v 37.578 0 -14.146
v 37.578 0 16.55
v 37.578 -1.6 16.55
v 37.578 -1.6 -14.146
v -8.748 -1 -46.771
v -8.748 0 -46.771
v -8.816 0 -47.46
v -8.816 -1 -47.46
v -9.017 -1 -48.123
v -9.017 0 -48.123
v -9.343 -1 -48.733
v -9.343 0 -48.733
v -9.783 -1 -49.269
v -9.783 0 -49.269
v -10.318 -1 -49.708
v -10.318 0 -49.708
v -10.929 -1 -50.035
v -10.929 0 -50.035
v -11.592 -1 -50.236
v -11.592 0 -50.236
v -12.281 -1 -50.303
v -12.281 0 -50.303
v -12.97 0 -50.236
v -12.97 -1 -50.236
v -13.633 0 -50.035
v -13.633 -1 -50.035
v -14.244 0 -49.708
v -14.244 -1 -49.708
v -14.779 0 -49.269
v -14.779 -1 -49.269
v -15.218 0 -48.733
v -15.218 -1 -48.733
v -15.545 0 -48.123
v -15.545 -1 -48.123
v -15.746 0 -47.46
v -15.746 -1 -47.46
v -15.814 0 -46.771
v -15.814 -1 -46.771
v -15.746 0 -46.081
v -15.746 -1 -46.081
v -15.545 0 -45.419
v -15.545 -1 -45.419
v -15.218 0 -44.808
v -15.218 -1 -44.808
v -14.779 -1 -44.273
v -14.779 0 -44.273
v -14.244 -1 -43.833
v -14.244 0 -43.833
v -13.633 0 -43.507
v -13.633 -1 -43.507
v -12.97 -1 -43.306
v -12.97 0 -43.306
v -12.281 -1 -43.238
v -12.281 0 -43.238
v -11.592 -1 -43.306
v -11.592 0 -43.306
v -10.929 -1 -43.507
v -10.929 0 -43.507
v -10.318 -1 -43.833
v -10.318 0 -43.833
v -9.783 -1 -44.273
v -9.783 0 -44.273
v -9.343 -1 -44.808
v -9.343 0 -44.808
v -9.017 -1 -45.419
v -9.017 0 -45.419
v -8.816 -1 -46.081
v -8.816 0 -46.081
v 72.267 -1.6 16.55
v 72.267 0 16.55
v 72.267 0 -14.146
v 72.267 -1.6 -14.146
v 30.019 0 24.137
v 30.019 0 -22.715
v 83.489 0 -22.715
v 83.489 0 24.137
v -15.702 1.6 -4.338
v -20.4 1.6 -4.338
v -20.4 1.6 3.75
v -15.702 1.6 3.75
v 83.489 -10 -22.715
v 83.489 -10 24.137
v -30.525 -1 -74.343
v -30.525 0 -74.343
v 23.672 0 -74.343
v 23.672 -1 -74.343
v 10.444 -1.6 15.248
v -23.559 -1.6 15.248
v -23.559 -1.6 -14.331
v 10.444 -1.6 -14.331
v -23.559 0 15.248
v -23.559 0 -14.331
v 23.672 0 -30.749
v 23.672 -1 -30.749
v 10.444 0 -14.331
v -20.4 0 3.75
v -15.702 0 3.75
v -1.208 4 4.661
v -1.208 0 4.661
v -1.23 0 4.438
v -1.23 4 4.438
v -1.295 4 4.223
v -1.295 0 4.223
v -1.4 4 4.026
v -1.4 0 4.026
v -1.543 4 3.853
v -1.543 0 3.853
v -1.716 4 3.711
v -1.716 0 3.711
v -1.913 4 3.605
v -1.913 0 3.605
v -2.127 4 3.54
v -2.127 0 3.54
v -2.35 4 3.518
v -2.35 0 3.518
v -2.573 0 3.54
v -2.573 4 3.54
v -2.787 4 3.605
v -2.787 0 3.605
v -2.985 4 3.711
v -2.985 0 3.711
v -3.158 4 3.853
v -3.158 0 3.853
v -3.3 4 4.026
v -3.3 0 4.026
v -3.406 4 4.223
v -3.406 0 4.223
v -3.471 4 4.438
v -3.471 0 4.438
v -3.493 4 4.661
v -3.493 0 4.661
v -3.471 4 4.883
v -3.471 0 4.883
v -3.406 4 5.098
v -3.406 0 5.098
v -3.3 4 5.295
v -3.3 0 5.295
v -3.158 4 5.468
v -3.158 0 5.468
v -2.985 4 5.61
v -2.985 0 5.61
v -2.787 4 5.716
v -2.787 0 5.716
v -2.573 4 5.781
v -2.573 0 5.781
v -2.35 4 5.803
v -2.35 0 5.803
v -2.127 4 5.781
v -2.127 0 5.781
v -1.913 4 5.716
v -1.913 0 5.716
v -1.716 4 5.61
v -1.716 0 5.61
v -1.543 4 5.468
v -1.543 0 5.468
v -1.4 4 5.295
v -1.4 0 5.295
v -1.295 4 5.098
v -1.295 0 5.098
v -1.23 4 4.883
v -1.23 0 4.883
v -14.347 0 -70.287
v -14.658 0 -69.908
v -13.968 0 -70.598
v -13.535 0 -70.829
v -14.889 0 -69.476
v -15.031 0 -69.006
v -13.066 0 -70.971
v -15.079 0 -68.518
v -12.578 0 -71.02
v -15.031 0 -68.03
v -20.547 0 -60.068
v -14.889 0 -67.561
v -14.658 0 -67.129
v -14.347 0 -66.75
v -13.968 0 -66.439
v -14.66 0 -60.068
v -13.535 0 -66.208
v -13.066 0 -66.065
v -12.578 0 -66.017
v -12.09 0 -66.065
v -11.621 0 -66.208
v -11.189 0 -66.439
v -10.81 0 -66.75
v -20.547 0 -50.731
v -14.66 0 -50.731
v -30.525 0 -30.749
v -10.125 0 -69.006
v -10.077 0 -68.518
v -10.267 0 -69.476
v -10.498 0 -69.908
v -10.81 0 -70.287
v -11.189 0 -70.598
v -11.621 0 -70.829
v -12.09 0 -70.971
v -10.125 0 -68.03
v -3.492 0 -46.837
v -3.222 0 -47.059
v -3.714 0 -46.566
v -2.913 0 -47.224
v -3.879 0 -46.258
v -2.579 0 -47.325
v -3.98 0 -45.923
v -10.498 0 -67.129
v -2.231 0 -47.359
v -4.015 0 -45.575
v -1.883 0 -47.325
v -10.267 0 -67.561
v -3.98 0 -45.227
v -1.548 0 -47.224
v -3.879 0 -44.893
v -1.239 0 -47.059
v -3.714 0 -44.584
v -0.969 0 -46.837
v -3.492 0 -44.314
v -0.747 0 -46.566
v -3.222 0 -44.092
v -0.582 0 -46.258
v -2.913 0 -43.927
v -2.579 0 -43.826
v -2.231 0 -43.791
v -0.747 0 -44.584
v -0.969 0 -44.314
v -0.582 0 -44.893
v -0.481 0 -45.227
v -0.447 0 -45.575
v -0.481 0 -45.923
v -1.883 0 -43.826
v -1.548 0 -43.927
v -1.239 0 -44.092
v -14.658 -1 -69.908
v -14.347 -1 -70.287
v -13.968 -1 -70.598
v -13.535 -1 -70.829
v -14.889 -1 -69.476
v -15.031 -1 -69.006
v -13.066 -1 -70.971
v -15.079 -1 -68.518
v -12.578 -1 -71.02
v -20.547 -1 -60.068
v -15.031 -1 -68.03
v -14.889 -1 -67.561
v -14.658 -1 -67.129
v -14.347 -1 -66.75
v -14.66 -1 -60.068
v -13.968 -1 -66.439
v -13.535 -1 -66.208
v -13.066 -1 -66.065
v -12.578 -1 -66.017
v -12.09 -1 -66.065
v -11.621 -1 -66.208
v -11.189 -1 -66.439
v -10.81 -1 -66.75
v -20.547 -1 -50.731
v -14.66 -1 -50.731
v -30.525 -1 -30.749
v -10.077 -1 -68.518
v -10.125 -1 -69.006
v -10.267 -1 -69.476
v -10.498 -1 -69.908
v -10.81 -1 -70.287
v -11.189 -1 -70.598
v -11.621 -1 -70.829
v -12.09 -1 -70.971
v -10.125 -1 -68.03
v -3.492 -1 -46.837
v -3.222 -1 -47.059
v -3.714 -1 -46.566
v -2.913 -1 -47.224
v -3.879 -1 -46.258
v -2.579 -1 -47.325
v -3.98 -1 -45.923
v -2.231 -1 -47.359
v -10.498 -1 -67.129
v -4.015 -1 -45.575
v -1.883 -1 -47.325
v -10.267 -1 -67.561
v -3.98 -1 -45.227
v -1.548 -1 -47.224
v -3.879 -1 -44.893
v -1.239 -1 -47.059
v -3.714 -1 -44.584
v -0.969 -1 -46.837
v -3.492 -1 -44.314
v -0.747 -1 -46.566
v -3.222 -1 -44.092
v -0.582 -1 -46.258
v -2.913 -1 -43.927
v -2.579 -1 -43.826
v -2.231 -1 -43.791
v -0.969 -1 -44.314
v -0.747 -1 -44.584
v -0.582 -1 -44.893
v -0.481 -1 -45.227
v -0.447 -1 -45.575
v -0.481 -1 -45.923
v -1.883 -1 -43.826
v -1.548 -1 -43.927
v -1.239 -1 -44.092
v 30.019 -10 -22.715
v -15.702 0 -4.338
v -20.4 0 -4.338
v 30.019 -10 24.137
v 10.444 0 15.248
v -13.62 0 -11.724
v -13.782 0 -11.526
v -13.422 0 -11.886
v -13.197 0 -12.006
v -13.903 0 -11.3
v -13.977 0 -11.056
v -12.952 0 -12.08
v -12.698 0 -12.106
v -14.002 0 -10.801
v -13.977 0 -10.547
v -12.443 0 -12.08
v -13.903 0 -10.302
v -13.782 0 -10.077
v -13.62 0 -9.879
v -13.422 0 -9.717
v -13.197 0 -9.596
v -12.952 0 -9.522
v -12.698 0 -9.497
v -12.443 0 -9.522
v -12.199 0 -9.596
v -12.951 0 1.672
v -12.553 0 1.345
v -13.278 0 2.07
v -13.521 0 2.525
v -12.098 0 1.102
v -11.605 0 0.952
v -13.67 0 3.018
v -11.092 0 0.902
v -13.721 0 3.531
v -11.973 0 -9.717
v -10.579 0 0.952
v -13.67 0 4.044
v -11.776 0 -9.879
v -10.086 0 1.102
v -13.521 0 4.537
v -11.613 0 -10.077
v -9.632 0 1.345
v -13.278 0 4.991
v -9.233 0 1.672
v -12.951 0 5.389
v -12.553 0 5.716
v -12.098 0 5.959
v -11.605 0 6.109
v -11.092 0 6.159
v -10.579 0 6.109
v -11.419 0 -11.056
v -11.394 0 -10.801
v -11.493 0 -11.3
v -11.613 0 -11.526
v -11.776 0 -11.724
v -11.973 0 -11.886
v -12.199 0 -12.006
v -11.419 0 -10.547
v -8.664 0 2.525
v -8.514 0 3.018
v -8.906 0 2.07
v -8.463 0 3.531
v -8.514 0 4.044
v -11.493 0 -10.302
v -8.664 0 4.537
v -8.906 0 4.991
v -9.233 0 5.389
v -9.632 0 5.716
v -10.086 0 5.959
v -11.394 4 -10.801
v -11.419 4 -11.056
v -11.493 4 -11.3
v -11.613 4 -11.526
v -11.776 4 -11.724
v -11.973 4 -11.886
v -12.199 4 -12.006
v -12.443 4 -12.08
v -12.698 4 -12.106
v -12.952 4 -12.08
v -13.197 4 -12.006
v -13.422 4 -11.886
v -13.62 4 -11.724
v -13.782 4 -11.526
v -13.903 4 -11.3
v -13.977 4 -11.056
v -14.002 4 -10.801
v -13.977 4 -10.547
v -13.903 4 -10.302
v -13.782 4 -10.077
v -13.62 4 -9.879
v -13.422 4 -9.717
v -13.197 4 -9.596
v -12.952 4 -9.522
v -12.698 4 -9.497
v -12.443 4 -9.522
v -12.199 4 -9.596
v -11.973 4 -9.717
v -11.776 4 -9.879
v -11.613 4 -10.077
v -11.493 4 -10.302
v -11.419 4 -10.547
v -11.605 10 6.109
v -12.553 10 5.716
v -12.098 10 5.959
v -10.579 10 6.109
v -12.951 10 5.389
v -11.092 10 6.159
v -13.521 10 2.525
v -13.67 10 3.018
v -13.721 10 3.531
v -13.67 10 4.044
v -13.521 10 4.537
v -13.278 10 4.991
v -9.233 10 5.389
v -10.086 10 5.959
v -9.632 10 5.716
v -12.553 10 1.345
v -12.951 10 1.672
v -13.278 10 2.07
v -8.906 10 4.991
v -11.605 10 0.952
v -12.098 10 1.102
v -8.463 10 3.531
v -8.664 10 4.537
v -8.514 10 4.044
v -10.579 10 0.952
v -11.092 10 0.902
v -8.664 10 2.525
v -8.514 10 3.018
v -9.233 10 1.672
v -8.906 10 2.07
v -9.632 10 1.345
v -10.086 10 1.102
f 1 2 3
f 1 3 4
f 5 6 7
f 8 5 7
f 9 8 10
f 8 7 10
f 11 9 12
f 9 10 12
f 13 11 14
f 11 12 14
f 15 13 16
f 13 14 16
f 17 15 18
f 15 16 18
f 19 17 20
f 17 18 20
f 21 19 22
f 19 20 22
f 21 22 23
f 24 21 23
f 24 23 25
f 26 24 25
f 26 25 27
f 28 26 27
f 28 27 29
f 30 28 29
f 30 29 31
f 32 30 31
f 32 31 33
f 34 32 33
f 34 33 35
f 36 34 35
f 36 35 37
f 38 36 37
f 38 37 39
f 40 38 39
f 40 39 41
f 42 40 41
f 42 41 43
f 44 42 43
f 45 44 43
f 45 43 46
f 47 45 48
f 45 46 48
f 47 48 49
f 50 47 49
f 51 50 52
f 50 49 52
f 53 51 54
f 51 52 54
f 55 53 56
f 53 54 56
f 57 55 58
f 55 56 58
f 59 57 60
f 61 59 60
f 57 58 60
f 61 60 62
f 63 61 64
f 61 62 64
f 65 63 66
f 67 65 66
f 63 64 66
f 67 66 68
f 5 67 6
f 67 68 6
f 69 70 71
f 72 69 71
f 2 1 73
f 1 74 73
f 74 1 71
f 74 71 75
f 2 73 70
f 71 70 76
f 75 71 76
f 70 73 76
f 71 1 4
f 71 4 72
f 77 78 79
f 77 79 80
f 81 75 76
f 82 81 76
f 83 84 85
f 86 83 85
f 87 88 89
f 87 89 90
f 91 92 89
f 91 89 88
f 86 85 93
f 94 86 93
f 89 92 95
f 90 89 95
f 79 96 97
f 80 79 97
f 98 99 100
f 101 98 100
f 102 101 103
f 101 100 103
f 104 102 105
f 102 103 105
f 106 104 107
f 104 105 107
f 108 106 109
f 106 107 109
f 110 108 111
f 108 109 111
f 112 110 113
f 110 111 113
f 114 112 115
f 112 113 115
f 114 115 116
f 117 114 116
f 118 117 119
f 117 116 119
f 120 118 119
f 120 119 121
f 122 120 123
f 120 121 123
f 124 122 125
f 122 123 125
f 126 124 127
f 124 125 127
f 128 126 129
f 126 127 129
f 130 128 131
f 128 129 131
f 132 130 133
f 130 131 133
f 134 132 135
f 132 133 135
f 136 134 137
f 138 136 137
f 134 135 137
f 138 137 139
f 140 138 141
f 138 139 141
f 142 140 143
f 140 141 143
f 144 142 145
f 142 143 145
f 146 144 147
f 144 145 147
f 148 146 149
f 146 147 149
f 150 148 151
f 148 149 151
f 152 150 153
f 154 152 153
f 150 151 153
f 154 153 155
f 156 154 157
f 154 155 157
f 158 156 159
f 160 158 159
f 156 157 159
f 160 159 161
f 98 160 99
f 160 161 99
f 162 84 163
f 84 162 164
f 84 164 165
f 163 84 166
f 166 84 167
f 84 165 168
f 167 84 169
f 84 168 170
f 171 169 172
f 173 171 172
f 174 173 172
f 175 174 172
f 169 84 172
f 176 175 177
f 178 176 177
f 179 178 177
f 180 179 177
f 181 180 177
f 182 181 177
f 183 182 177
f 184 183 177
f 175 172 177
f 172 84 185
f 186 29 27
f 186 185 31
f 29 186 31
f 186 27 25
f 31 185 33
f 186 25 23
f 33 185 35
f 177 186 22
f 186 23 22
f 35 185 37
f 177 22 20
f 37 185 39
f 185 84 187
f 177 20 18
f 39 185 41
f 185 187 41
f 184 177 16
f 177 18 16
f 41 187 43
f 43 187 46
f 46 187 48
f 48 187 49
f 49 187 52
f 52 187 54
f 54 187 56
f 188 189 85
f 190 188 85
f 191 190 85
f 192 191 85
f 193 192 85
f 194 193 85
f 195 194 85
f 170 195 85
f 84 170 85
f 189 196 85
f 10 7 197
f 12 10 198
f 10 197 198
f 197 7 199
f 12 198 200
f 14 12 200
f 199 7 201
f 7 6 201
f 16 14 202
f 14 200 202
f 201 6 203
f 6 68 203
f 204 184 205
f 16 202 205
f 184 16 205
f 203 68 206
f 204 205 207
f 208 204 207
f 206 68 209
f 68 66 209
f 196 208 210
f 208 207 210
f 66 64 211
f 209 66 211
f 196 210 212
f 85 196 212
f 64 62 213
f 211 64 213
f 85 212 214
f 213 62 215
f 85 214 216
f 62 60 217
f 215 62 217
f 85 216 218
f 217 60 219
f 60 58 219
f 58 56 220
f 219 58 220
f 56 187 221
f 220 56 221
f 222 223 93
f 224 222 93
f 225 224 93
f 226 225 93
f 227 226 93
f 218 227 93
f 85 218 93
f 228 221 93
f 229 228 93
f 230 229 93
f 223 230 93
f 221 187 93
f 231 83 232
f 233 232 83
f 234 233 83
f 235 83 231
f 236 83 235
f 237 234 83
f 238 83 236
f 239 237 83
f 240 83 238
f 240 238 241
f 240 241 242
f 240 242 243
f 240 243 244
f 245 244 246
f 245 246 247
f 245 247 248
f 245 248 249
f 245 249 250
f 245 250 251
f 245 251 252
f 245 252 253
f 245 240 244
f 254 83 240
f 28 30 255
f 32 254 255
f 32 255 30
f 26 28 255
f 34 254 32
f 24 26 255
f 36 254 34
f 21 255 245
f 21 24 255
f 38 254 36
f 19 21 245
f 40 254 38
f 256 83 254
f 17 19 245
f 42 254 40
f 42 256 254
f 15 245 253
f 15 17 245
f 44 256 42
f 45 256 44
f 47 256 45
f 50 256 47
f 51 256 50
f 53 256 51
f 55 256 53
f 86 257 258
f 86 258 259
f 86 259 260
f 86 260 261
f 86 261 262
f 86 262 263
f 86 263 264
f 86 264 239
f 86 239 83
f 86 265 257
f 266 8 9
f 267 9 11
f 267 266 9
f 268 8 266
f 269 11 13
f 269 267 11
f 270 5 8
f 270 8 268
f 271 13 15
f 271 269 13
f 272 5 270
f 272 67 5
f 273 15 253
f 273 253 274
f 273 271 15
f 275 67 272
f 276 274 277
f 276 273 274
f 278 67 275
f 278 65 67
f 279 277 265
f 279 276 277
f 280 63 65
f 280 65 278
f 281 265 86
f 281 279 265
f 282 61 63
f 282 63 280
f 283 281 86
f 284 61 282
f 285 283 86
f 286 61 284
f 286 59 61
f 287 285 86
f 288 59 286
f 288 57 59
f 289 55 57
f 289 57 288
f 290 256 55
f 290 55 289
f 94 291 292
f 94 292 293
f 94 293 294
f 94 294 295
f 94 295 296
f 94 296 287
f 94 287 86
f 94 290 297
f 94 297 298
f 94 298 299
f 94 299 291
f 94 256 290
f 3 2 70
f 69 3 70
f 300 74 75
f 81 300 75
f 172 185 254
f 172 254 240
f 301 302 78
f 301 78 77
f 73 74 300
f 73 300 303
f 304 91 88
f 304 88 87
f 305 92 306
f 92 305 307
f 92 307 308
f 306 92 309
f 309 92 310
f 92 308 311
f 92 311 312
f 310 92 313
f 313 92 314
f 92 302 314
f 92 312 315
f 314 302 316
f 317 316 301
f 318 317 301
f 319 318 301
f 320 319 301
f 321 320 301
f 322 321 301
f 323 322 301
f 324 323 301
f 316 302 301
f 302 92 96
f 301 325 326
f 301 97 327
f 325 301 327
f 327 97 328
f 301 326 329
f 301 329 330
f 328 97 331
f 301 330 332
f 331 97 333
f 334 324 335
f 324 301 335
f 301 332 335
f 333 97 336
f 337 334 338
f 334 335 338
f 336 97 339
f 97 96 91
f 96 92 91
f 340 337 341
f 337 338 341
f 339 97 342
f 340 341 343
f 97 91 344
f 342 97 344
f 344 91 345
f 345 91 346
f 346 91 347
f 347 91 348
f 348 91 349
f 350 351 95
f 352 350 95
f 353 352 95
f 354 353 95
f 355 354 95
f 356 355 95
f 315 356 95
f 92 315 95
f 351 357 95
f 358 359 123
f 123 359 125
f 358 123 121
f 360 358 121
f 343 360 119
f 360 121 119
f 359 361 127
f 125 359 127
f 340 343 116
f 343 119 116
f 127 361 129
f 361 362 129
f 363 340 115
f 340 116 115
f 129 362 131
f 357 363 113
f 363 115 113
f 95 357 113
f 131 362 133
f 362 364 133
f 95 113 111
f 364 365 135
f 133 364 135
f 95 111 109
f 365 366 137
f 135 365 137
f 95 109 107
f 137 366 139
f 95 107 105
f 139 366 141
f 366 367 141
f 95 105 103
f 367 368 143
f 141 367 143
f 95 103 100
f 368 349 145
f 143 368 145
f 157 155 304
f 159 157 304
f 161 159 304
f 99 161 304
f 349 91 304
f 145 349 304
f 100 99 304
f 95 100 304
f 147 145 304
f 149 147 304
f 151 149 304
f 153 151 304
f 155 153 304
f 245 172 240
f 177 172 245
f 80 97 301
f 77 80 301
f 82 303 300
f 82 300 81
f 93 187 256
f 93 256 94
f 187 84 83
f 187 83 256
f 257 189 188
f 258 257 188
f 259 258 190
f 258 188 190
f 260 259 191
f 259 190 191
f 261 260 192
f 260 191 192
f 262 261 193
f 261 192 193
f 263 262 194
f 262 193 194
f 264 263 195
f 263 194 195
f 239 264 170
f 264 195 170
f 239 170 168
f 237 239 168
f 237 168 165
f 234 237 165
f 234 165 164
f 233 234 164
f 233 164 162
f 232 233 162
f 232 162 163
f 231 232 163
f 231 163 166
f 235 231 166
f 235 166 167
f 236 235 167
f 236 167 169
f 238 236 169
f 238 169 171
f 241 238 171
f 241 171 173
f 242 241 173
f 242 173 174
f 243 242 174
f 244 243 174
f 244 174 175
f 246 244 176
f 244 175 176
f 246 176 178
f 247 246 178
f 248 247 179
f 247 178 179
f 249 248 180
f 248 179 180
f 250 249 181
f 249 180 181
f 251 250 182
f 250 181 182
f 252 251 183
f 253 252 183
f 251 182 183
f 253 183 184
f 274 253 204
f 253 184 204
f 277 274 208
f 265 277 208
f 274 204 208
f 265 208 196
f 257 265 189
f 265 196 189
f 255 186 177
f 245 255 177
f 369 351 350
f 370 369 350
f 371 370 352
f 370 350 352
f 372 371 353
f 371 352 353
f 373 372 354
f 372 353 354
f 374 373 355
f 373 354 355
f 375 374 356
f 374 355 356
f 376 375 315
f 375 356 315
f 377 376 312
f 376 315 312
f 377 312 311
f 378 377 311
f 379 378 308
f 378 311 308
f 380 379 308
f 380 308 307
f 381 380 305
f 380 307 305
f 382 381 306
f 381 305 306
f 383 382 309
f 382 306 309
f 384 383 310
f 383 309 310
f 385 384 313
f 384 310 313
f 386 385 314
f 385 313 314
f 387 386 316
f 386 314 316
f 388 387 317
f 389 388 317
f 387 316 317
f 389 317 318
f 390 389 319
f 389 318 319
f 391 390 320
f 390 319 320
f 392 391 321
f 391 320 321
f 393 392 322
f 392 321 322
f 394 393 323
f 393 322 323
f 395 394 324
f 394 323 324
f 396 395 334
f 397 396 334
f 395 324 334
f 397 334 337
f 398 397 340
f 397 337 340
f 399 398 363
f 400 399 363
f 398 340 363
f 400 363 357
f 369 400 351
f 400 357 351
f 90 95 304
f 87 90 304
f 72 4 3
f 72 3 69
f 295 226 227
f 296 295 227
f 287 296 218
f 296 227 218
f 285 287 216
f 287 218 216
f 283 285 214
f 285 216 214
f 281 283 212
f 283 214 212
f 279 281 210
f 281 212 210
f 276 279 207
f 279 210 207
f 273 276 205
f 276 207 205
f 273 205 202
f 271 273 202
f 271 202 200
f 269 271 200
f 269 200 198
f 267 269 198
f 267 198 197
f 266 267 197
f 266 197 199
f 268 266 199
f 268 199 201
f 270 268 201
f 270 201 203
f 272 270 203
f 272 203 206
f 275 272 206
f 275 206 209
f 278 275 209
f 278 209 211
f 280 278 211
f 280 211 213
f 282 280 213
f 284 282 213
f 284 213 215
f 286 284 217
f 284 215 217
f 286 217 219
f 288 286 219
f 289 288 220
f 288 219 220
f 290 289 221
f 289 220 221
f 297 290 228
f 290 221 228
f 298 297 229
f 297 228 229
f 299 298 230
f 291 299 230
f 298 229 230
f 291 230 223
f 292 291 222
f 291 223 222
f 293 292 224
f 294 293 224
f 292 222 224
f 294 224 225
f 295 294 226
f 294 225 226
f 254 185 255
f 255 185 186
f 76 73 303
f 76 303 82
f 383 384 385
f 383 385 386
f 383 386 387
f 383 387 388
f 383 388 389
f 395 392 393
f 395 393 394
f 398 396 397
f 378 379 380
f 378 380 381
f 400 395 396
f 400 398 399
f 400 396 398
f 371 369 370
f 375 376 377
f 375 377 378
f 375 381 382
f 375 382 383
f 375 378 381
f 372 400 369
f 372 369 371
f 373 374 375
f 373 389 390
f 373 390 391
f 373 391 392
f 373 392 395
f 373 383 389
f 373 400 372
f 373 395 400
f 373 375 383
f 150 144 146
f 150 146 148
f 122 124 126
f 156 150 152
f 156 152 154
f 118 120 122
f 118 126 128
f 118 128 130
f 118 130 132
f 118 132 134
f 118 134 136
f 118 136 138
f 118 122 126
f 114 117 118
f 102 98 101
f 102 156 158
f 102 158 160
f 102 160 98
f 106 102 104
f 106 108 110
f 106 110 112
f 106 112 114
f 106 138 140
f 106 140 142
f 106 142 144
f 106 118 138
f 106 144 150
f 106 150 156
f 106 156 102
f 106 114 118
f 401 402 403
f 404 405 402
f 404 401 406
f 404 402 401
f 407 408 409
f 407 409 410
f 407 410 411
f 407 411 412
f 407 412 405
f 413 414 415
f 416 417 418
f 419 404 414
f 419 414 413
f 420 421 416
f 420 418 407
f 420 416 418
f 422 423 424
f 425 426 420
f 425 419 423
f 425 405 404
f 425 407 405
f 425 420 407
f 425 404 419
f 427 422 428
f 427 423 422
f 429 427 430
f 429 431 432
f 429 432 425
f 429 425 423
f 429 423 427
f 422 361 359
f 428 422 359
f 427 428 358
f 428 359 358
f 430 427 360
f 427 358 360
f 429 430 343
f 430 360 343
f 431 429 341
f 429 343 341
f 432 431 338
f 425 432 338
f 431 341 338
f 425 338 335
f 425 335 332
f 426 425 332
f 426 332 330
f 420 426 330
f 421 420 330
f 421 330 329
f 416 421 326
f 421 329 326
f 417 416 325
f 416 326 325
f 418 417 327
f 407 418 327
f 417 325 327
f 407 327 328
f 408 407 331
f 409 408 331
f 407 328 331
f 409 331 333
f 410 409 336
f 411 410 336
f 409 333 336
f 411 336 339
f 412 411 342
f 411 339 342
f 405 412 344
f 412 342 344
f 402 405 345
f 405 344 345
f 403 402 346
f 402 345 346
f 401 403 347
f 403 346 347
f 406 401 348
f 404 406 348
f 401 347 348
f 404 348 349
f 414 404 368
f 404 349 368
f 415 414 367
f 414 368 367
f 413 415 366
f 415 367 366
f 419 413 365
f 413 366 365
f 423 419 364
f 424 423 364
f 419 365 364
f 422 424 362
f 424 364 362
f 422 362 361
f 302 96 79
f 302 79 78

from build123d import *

# Parameters (mm, degrees)
SKETCH_W        = 34.003207
SKETCH_H        = 29.578406
PAD_DEPTH       = 1.6
SKETCH001_W     = 4.698031
SKETCH001_H     = 8.087746
PAD001_DEPTH    = 1.6
SKETCH002_R     = 1.142358
PAD002_DEPTH    = 4
SKETCH003_R     = 1.304251
PAD003_DEPTH    = 4
SKETCH004_R     = 2.628762
PAD004_DEPTH    = 10
SKETCH005_W     = 53.46946
SKETCH005_H     = 46.851956
PAD005_DEPTH    = 10
SKETCH007_W     = 34.688423
SKETCH007_H     = 30.696152
POCKET_DEPTH    = 1.6
SKETCH008_W     = 54.197322
SKETCH008_H     = 43.593485
PAD006_DEPTH    = 1
SKETCH011_R     = 3.532764
SKETCH011_R_2   = 1.784062
SKETCH011_R_3   = 2.501222
SKETCH011_W     = 5.887407
SKETCH011_H     = 9.336594
POCKET001_DEPTH = 5


with BuildPart() as body:
    # Sketch → Pad (new body)
    with BuildSketch(Plane.XZ):
        with Locations((-6.557476, 0.458427)):
            Rectangle(SKETCH_W, SKETCH_H)
    extrude(amount=PAD_DEPTH)

    # Sketch001 (on Face5 of Pad) → Pad001 (join)
    with BuildSketch(Plane(origin=(0, 0, 0), x_dir=(1, 0, 0), z_dir=(0, 1, 0))):
        with Locations((-18.050574, 0.293694)):
            Rectangle(SKETCH001_W, SKETCH001_H)
    extrude(amount=PAD001_DEPTH)

    # Sketch002 (on Face4 of Pad001) → Pad002 (join)
    with BuildSketch(Plane(origin=(0, 0, 0), x_dir=(1, 0, 0), z_dir=(0, 1, 0))):
        with Locations((-2.350305, -4.660569)):
            Circle(SKETCH002_R)
    extrude(amount=PAD002_DEPTH)

    # Sketch003 (on Face4 of Pad002) → Pad003 (join)
    with BuildSketch(Plane(origin=(0, 0, 0), x_dir=(1, 0, 0), z_dir=(0, 1, 0))):
        with Locations((-12.697866, 10.801292)):
            Circle(SKETCH003_R)
    extrude(amount=PAD003_DEPTH)

    # Sketch004 (on Face4 of Pad003) → Pad004 (join)
    with BuildSketch(Plane(origin=(0, 0, 0), x_dir=(1, 0, 0), z_dir=(0, 1, 0))):
        with Locations((-11.092212, -3.53067)):
            Circle(SKETCH004_R)
    extrude(amount=PAD004_DEPTH)


with BuildPart() as body006:
    # Sketch005 → Pad005 (new body)
    with BuildSketch(Plane.XZ):
        with Locations((56.753948, 0.711401)):
            Rectangle(SKETCH005_W, SKETCH005_H)
    extrude(amount=PAD005_DEPTH)

    # Sketch007 (on Face5 of Pad005) → Pocket (cut)
    with BuildSketch(Plane(origin=(0, 0, 0), x_dir=(1, 0, 0), z_dir=(0, 1, 0))):
        with Locations((54.922473, -1.202261)):
            Rectangle(SKETCH007_W, SKETCH007_H)
    extrude(amount=-POCKET_DEPTH, mode=Mode.SUBTRACT)


with BuildPart() as body007:
    # Sketch008 → Pad006 (new body)
    with BuildSketch(Plane.XZ):
        with Locations((-3.426609, -52.546)):
            Rectangle(SKETCH008_W, SKETCH008_H)
    extrude(amount=PAD006_DEPTH)

    # Sketch011 (on Face5 of Pad006) → Pocket001 (cut)
    with BuildSketch(Plane(origin=(0, 0, 0), x_dir=(1, 0, 0), z_dir=(0, 1, 0))):
        with Locations((-12.280838, 46.770668)):
            Circle(SKETCH011_R)
        with Locations((-2.23062, 45.575317)):
            Circle(SKETCH011_R_2)
        with Locations((-12.578182, 68.518333)):
            Circle(SKETCH011_R_3)
        with Locations((-17.603291, 55.399494)):
            Rectangle(SKETCH011_W, SKETCH011_H)
    extrude(amount=-POCKET001_DEPTH, mode=Mode.SUBTRACT)


solid = Compound([body.part, body006.part, body007.part])
